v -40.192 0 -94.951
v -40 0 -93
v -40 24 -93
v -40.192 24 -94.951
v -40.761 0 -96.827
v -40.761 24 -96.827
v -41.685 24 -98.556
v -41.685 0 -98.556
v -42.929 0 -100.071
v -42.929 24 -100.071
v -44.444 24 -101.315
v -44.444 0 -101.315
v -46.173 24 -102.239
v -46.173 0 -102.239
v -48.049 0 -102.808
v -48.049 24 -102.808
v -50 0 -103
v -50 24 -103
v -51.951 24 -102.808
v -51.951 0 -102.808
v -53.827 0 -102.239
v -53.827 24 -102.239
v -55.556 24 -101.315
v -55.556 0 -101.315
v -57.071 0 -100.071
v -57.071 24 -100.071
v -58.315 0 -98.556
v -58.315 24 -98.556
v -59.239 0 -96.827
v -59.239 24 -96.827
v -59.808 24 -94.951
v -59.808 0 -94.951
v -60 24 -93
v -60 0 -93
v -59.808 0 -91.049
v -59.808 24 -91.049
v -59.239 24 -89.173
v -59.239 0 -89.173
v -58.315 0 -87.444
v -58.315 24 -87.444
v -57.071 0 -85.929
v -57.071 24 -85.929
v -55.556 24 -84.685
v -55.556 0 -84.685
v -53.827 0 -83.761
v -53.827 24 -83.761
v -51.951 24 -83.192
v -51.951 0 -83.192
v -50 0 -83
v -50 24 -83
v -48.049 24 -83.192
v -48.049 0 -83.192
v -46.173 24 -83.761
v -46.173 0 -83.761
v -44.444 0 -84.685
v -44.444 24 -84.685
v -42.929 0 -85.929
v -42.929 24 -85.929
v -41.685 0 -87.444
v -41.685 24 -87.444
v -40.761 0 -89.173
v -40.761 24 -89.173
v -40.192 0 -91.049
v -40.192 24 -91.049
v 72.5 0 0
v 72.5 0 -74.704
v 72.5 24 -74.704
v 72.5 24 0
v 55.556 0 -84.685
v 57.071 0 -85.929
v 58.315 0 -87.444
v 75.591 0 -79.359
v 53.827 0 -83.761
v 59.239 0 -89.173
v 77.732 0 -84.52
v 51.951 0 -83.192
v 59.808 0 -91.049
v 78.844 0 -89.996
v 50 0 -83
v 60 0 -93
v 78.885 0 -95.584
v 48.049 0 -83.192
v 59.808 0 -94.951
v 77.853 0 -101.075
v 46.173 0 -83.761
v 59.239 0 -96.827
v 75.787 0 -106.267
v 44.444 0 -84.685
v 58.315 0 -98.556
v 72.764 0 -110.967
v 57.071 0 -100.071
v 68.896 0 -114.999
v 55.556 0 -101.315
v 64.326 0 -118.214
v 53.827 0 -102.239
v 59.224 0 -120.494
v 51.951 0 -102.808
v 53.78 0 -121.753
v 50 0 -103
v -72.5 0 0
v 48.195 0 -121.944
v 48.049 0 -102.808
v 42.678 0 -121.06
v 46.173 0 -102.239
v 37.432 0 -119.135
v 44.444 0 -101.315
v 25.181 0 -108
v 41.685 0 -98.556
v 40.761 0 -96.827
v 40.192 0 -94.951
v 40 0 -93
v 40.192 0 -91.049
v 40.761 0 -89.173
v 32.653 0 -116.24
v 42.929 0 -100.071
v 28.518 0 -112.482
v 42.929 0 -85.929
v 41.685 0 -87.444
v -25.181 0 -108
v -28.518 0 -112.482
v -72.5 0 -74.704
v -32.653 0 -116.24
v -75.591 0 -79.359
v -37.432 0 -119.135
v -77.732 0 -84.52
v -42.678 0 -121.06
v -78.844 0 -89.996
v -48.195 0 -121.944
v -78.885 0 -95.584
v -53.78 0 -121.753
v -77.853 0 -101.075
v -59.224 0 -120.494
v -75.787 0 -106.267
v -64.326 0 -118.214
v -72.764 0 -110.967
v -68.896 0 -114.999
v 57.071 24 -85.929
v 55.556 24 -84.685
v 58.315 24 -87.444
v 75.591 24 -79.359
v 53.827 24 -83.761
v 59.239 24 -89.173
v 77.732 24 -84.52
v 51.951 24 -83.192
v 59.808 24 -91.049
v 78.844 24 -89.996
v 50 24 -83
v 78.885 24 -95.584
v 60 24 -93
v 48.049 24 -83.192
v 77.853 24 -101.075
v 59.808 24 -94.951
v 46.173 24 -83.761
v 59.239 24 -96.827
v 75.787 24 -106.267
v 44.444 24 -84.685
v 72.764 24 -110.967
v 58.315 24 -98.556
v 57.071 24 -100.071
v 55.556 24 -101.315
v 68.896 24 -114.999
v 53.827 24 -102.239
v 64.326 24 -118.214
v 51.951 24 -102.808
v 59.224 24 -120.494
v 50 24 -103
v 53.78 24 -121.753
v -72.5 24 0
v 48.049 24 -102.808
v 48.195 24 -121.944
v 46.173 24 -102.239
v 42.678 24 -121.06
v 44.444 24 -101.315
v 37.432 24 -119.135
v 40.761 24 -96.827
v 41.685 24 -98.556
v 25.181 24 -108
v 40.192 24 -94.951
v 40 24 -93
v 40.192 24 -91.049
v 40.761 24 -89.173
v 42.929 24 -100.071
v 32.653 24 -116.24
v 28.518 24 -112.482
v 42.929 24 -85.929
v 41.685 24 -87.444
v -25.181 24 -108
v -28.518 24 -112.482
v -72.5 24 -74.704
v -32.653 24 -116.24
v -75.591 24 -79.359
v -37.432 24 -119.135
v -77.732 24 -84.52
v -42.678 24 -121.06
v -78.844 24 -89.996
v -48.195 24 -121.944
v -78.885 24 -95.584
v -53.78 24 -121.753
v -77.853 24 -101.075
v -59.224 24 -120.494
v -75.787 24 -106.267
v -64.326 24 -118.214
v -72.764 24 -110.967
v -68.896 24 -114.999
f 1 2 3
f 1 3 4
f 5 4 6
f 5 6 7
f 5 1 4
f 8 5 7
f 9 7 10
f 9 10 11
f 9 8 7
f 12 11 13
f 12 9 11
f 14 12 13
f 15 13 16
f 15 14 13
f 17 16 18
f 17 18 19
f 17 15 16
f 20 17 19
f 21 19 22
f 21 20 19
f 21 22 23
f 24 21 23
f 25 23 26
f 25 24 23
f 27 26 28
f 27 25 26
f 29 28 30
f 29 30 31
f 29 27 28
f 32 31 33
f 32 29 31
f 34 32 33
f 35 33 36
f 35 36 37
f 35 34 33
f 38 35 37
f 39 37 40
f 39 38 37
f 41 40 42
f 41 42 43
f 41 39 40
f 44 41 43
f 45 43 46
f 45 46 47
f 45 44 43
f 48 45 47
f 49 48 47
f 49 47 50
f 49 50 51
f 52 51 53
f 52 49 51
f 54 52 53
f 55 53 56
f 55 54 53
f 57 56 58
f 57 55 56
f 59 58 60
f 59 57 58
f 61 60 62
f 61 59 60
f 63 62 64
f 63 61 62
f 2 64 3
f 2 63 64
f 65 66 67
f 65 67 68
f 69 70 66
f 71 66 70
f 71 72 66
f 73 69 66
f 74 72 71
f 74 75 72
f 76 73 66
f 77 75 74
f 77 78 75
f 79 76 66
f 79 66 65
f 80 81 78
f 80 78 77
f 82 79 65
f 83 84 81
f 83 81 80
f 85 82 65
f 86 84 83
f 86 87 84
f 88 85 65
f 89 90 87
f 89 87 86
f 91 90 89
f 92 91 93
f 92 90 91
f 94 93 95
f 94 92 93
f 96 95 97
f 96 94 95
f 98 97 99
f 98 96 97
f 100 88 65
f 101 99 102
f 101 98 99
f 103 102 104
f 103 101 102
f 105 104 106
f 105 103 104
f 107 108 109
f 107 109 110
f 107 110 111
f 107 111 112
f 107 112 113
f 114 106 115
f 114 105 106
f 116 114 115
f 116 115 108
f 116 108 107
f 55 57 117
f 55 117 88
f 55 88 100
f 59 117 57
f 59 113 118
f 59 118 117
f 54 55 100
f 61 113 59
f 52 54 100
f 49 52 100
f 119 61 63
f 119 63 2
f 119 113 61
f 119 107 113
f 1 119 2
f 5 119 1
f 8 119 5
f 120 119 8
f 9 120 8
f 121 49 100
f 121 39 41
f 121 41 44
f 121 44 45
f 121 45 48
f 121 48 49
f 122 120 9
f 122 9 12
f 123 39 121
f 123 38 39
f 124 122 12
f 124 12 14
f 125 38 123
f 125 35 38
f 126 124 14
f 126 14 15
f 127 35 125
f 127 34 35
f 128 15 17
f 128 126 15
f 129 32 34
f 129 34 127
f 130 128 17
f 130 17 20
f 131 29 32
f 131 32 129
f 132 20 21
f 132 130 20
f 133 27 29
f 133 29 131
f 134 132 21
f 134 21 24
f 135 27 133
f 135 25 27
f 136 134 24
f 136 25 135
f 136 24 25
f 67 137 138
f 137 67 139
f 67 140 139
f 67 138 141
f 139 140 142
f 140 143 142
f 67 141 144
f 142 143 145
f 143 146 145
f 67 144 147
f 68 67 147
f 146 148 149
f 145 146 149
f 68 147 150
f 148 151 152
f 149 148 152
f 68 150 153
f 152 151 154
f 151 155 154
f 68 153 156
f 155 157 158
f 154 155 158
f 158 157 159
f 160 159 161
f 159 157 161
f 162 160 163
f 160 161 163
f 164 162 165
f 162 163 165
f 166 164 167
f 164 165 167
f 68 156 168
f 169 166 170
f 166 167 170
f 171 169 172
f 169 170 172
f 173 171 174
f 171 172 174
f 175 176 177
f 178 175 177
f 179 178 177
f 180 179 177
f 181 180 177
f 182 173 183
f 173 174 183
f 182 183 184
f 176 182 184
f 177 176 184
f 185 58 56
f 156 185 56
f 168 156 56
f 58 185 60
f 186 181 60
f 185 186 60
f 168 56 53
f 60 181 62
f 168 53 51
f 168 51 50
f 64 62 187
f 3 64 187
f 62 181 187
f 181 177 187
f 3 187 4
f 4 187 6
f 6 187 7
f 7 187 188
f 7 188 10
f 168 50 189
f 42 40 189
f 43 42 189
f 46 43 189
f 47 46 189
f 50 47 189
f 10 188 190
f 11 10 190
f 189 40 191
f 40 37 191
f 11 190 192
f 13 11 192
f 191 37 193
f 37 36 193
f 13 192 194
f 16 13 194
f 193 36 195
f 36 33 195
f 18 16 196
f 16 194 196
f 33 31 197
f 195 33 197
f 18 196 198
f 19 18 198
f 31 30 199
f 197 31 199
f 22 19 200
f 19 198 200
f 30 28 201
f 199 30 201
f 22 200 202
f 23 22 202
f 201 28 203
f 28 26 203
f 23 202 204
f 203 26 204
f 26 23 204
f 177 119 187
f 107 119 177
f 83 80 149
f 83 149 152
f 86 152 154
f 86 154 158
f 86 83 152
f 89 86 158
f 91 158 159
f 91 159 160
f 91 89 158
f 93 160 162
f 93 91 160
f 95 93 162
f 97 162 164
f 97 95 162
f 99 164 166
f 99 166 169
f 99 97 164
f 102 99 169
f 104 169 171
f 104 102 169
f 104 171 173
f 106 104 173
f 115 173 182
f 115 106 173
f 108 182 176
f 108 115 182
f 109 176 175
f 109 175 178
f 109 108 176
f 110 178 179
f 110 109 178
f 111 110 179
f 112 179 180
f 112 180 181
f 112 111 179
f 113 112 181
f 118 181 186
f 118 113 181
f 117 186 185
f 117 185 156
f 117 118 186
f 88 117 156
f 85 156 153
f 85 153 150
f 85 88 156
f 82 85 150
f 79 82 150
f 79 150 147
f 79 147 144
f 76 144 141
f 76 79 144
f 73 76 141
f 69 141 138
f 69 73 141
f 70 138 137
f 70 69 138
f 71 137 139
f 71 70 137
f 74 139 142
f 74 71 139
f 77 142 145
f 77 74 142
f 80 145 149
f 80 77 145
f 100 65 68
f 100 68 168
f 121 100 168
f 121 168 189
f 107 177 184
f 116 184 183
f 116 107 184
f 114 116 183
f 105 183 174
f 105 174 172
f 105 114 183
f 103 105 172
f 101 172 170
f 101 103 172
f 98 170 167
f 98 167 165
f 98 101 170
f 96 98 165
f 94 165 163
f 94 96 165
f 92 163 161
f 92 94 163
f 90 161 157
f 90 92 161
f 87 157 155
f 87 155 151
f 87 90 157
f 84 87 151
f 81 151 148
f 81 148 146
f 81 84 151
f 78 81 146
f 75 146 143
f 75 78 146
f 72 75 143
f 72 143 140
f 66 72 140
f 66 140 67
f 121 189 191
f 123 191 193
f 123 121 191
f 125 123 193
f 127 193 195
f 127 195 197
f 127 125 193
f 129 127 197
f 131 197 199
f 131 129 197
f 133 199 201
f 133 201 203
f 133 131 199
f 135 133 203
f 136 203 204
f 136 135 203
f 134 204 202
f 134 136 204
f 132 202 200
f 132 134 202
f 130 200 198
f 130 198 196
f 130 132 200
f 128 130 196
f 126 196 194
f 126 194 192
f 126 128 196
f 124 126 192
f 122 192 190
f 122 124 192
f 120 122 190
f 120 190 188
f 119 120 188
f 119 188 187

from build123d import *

# Parameters (mm, degrees)
SKETCH1_R           = 10
BOSS_EXTRUDE1_DEPTH = 24


with BuildPart() as part:
    # Sketch1 → Boss-Extrude1 (new body)
    with BuildSketch(Plane(origin=(0, 0, 0), x_dir=(1, 0, 0), z_dir=(0, 1, 0))):
        with BuildLine():
            Line((72.5, 0), (-72.5, 0))
            Line((-72.5, 0), (-72.5, 74.703825536))
            ThreePointArc((-72.5, 74.703825536), (-66.688428669, 116.717005472), (-25.180652708, 108))
            Line((-25.180652708, 108), (25.180652708, 108))
            ThreePointArc((25.180652708, 108), (66.688428669, 116.717005472), (72.5, 74.703825536))
            Line((72.5, 74.703825536), (72.5, 0))
        make_face()
        with Locations((-50, 93)):
            Circle(SKETCH1_R, mode=Mode.SUBTRACT)
        with Locations((50, 93)):
            Circle(SKETCH1_R, mode=Mode.SUBTRACT)
    extrude(amount=BOSS_EXTRUDE1_DEPTH)


solid = part.part
